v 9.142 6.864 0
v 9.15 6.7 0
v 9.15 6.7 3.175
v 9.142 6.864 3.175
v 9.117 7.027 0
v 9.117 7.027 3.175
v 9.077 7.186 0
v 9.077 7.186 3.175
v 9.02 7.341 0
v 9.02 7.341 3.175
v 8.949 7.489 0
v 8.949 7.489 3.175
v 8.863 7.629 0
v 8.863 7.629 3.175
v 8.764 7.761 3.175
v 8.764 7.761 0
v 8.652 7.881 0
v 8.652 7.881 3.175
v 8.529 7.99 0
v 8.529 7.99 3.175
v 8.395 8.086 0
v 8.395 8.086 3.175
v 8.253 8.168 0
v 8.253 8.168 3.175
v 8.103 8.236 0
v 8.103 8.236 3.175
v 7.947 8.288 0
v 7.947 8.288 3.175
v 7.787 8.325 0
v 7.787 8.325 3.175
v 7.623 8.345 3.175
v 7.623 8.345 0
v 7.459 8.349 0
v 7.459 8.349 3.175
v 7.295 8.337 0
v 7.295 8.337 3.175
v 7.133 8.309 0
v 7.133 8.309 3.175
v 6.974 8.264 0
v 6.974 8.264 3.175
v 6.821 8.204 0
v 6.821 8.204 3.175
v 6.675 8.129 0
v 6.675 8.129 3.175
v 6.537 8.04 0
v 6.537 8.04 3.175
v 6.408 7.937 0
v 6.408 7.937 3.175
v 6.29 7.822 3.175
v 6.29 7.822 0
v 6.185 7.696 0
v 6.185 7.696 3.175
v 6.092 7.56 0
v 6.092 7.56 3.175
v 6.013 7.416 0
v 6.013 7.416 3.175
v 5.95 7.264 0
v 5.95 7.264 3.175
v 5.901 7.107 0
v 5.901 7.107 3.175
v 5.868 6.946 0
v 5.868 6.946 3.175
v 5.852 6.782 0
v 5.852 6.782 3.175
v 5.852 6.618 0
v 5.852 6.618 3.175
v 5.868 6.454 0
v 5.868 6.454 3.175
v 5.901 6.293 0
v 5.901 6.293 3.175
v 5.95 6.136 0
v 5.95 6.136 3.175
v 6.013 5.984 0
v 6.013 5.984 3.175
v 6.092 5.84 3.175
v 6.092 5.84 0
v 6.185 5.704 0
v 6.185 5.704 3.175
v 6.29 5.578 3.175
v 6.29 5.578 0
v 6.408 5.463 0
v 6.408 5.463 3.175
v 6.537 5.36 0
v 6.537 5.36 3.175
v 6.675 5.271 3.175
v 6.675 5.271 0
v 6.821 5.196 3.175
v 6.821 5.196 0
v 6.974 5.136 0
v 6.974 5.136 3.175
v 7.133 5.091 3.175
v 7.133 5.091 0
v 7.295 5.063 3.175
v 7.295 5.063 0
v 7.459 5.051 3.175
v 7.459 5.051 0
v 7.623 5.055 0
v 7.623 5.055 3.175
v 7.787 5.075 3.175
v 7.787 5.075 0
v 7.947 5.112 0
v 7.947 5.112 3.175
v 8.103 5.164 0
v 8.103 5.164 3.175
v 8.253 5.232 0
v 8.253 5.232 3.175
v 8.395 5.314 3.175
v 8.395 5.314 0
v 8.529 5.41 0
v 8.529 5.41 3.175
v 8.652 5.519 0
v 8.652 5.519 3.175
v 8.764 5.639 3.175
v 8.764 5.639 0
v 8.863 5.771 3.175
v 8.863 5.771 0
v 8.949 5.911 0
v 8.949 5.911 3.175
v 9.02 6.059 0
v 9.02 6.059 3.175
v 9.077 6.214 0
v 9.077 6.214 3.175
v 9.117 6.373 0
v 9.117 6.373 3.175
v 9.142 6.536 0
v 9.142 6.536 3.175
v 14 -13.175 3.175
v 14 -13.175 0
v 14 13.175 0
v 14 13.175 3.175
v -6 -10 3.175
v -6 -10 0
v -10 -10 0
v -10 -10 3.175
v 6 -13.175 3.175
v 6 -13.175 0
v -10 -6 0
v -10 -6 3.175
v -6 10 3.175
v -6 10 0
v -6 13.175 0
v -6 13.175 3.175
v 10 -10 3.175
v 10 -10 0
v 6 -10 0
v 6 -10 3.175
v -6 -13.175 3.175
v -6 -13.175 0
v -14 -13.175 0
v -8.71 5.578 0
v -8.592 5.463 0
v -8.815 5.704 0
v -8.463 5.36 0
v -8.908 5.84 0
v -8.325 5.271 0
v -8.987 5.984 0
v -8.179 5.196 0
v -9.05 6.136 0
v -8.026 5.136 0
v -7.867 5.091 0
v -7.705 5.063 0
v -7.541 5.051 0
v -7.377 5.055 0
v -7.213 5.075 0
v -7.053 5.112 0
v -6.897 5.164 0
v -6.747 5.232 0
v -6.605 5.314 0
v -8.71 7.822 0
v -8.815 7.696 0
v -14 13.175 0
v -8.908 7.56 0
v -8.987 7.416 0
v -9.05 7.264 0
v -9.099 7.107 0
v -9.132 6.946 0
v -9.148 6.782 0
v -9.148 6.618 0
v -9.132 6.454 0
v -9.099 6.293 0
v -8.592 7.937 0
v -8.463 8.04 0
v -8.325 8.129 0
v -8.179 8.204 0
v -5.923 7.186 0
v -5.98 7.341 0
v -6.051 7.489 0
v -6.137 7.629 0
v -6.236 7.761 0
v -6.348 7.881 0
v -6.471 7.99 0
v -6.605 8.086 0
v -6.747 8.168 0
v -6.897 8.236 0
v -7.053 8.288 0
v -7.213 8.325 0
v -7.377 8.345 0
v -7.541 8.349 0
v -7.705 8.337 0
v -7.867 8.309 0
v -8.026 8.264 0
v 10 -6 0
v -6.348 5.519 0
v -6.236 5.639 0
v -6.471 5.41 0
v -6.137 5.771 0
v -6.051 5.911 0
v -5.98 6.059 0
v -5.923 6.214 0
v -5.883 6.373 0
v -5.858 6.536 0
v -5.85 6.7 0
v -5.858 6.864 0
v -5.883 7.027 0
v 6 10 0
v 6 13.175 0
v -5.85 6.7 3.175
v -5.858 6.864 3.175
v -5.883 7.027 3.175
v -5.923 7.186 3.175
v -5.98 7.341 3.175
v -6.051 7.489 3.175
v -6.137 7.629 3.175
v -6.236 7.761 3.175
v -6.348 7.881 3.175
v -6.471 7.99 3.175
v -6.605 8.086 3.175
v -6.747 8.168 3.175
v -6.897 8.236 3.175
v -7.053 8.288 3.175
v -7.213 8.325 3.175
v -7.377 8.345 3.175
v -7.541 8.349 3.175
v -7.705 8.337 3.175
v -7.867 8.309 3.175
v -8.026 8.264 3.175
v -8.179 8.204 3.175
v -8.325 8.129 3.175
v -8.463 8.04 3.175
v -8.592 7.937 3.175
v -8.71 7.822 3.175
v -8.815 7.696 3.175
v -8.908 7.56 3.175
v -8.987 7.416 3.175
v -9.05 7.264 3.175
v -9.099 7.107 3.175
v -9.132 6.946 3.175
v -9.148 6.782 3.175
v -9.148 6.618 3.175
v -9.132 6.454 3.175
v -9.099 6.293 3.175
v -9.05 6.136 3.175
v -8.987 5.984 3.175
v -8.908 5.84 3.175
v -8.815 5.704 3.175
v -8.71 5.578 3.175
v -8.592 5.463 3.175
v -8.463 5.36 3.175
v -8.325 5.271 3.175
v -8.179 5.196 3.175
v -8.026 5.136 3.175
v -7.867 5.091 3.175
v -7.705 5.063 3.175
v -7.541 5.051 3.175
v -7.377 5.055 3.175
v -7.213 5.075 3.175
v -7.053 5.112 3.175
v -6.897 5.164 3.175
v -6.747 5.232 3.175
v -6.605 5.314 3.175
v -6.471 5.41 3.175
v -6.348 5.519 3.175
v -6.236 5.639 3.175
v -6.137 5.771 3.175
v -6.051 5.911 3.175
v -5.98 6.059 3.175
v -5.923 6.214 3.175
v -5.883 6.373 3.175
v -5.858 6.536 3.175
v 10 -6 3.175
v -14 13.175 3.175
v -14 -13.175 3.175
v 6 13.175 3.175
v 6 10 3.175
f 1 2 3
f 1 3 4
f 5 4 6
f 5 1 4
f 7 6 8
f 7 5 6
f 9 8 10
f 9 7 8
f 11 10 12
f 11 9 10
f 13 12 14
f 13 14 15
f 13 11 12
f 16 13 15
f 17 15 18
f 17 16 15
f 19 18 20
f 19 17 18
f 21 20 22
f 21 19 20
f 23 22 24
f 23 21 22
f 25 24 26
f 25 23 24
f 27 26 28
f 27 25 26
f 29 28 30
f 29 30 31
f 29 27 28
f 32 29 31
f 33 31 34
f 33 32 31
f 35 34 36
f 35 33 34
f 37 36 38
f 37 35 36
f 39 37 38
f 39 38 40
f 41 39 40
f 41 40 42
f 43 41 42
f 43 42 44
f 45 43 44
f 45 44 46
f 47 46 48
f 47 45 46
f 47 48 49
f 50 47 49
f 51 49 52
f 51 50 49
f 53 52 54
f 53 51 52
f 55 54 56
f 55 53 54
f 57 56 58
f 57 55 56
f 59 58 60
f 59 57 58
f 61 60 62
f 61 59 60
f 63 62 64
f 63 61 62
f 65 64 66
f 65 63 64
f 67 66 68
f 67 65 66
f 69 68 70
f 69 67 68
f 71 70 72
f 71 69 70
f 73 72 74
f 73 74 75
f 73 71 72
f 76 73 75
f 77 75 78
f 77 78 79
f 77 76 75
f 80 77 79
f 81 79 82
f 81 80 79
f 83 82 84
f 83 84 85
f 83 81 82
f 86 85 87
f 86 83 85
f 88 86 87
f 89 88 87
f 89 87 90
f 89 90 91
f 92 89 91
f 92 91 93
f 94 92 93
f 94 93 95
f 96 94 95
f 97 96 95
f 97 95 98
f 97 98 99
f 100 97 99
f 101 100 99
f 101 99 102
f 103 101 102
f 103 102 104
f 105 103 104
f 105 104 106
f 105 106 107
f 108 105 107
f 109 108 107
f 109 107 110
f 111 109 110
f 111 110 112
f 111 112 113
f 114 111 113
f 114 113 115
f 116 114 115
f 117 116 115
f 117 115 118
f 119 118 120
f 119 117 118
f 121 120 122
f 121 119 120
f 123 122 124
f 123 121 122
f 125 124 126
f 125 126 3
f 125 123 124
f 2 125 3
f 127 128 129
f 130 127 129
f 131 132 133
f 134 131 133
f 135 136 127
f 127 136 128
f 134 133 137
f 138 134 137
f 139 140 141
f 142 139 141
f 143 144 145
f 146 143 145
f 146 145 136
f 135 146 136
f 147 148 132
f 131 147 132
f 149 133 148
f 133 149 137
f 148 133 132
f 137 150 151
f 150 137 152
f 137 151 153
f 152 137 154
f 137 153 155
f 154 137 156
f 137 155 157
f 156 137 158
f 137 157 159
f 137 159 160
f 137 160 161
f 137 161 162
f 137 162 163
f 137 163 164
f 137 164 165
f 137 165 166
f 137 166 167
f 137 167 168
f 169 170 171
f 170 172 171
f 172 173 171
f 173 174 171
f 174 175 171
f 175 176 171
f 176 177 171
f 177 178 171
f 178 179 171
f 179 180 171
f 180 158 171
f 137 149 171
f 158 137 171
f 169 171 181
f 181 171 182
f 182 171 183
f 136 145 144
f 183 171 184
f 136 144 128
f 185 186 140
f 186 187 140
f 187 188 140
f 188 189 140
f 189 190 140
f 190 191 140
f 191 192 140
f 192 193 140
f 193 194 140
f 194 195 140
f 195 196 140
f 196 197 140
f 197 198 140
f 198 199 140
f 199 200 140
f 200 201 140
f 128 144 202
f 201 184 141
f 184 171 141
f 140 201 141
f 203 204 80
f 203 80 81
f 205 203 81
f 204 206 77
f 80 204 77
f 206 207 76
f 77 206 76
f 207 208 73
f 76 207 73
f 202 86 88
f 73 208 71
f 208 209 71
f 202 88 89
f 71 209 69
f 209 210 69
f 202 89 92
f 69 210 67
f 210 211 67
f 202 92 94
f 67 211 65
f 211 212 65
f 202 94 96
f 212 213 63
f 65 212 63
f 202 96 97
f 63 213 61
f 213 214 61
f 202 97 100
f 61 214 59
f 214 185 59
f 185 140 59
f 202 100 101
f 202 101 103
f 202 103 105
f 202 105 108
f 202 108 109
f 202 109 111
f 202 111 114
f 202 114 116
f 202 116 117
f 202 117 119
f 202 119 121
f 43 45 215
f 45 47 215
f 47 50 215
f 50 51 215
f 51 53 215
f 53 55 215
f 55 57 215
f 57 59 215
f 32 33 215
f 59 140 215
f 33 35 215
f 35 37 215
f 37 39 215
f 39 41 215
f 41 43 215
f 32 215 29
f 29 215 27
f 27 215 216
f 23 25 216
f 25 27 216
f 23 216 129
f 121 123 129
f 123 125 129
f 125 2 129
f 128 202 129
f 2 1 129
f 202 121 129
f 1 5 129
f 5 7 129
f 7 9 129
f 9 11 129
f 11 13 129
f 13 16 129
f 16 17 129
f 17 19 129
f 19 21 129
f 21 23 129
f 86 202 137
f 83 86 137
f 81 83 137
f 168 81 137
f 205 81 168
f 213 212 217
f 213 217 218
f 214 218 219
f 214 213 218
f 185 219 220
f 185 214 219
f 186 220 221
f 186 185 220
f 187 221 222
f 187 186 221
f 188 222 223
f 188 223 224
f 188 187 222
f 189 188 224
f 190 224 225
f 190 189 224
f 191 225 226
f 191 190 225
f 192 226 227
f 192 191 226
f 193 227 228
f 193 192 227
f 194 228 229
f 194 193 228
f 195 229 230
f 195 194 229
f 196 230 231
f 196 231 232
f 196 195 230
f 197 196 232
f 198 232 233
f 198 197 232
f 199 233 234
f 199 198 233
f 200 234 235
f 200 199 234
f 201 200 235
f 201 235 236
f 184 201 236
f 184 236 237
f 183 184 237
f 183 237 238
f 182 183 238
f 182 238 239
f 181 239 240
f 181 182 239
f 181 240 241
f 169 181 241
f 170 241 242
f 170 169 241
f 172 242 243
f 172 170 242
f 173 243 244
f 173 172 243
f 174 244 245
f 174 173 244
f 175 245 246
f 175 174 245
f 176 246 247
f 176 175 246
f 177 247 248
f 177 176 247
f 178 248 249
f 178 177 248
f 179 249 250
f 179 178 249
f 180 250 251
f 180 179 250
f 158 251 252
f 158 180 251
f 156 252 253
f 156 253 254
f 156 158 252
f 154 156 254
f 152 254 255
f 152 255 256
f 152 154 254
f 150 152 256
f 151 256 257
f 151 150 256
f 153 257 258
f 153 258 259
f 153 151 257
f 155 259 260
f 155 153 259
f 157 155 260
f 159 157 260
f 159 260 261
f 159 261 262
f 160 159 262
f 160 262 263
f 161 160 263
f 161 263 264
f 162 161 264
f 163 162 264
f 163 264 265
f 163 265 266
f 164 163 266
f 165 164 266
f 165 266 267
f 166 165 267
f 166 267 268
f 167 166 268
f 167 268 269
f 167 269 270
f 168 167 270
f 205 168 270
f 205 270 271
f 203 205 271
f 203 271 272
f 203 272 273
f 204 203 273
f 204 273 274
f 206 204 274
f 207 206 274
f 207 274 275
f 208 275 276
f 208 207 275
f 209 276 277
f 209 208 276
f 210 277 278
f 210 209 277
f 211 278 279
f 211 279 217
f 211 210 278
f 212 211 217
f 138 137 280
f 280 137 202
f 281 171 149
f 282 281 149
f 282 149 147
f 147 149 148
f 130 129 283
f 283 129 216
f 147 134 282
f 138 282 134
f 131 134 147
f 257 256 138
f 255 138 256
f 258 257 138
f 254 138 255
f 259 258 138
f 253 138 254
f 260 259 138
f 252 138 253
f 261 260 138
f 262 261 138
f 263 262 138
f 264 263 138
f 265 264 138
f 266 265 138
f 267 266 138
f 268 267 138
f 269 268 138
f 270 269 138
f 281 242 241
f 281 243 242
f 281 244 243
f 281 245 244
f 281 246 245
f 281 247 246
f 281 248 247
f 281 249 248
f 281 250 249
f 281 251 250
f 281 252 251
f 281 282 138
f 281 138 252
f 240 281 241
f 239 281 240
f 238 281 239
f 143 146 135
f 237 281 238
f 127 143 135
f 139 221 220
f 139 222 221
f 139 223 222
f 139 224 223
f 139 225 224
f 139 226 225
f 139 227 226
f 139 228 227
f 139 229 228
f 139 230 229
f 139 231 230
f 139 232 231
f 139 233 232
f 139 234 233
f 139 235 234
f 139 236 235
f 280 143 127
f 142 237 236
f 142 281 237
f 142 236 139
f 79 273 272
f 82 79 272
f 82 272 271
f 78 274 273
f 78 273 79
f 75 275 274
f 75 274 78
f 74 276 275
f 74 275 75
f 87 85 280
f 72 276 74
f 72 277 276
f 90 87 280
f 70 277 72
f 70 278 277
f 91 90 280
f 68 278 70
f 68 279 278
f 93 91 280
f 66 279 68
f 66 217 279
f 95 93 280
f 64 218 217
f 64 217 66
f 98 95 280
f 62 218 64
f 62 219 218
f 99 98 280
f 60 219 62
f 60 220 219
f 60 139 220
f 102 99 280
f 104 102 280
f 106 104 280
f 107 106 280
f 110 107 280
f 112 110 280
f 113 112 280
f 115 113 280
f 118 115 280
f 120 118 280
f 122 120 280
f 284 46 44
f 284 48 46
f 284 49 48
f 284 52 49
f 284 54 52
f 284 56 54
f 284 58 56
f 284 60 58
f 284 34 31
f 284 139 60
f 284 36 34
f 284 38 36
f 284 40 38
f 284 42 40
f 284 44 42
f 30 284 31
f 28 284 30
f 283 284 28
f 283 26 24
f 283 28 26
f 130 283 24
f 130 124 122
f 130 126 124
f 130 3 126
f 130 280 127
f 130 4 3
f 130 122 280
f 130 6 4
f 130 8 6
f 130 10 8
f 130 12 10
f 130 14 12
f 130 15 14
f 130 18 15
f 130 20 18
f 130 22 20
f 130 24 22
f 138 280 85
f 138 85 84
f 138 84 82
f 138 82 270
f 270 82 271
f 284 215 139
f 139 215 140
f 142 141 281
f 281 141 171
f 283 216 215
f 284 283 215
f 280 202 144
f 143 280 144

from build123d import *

# Parameters (mm, degrees)
SKETCH1_R           = 1.65
BOSS_EXTRUDE1_DEPTH = 3.175


with BuildPart() as part:
    # Sketch1 → Boss-Extrude1 (new body)
    with BuildSketch(Plane.XY):
        Polygon((-14, 13.175), (-14, 10), (-14, -10), (-14, -13.175), (-6, -13.175), (-6, -10), (-10, -10), (-10, -6), (10, -6), (10, -10), (6, -10), (6, -13.175), (14, -13.175), (14, -10), (14, 10), (14, 13.175), (6, 13.175), (6, 10), (-6, 10), (-6, 13.175), align=None)
        with Locations((-7.5, 6.7)):
            Circle(SKETCH1_R, mode=Mode.SUBTRACT)
        with Locations((7.5, 6.7)):
            Circle(SKETCH1_R, mode=Mode.SUBTRACT)
    extrude(amount=BOSS_EXTRUDE1_DEPTH)


solid = part.part
